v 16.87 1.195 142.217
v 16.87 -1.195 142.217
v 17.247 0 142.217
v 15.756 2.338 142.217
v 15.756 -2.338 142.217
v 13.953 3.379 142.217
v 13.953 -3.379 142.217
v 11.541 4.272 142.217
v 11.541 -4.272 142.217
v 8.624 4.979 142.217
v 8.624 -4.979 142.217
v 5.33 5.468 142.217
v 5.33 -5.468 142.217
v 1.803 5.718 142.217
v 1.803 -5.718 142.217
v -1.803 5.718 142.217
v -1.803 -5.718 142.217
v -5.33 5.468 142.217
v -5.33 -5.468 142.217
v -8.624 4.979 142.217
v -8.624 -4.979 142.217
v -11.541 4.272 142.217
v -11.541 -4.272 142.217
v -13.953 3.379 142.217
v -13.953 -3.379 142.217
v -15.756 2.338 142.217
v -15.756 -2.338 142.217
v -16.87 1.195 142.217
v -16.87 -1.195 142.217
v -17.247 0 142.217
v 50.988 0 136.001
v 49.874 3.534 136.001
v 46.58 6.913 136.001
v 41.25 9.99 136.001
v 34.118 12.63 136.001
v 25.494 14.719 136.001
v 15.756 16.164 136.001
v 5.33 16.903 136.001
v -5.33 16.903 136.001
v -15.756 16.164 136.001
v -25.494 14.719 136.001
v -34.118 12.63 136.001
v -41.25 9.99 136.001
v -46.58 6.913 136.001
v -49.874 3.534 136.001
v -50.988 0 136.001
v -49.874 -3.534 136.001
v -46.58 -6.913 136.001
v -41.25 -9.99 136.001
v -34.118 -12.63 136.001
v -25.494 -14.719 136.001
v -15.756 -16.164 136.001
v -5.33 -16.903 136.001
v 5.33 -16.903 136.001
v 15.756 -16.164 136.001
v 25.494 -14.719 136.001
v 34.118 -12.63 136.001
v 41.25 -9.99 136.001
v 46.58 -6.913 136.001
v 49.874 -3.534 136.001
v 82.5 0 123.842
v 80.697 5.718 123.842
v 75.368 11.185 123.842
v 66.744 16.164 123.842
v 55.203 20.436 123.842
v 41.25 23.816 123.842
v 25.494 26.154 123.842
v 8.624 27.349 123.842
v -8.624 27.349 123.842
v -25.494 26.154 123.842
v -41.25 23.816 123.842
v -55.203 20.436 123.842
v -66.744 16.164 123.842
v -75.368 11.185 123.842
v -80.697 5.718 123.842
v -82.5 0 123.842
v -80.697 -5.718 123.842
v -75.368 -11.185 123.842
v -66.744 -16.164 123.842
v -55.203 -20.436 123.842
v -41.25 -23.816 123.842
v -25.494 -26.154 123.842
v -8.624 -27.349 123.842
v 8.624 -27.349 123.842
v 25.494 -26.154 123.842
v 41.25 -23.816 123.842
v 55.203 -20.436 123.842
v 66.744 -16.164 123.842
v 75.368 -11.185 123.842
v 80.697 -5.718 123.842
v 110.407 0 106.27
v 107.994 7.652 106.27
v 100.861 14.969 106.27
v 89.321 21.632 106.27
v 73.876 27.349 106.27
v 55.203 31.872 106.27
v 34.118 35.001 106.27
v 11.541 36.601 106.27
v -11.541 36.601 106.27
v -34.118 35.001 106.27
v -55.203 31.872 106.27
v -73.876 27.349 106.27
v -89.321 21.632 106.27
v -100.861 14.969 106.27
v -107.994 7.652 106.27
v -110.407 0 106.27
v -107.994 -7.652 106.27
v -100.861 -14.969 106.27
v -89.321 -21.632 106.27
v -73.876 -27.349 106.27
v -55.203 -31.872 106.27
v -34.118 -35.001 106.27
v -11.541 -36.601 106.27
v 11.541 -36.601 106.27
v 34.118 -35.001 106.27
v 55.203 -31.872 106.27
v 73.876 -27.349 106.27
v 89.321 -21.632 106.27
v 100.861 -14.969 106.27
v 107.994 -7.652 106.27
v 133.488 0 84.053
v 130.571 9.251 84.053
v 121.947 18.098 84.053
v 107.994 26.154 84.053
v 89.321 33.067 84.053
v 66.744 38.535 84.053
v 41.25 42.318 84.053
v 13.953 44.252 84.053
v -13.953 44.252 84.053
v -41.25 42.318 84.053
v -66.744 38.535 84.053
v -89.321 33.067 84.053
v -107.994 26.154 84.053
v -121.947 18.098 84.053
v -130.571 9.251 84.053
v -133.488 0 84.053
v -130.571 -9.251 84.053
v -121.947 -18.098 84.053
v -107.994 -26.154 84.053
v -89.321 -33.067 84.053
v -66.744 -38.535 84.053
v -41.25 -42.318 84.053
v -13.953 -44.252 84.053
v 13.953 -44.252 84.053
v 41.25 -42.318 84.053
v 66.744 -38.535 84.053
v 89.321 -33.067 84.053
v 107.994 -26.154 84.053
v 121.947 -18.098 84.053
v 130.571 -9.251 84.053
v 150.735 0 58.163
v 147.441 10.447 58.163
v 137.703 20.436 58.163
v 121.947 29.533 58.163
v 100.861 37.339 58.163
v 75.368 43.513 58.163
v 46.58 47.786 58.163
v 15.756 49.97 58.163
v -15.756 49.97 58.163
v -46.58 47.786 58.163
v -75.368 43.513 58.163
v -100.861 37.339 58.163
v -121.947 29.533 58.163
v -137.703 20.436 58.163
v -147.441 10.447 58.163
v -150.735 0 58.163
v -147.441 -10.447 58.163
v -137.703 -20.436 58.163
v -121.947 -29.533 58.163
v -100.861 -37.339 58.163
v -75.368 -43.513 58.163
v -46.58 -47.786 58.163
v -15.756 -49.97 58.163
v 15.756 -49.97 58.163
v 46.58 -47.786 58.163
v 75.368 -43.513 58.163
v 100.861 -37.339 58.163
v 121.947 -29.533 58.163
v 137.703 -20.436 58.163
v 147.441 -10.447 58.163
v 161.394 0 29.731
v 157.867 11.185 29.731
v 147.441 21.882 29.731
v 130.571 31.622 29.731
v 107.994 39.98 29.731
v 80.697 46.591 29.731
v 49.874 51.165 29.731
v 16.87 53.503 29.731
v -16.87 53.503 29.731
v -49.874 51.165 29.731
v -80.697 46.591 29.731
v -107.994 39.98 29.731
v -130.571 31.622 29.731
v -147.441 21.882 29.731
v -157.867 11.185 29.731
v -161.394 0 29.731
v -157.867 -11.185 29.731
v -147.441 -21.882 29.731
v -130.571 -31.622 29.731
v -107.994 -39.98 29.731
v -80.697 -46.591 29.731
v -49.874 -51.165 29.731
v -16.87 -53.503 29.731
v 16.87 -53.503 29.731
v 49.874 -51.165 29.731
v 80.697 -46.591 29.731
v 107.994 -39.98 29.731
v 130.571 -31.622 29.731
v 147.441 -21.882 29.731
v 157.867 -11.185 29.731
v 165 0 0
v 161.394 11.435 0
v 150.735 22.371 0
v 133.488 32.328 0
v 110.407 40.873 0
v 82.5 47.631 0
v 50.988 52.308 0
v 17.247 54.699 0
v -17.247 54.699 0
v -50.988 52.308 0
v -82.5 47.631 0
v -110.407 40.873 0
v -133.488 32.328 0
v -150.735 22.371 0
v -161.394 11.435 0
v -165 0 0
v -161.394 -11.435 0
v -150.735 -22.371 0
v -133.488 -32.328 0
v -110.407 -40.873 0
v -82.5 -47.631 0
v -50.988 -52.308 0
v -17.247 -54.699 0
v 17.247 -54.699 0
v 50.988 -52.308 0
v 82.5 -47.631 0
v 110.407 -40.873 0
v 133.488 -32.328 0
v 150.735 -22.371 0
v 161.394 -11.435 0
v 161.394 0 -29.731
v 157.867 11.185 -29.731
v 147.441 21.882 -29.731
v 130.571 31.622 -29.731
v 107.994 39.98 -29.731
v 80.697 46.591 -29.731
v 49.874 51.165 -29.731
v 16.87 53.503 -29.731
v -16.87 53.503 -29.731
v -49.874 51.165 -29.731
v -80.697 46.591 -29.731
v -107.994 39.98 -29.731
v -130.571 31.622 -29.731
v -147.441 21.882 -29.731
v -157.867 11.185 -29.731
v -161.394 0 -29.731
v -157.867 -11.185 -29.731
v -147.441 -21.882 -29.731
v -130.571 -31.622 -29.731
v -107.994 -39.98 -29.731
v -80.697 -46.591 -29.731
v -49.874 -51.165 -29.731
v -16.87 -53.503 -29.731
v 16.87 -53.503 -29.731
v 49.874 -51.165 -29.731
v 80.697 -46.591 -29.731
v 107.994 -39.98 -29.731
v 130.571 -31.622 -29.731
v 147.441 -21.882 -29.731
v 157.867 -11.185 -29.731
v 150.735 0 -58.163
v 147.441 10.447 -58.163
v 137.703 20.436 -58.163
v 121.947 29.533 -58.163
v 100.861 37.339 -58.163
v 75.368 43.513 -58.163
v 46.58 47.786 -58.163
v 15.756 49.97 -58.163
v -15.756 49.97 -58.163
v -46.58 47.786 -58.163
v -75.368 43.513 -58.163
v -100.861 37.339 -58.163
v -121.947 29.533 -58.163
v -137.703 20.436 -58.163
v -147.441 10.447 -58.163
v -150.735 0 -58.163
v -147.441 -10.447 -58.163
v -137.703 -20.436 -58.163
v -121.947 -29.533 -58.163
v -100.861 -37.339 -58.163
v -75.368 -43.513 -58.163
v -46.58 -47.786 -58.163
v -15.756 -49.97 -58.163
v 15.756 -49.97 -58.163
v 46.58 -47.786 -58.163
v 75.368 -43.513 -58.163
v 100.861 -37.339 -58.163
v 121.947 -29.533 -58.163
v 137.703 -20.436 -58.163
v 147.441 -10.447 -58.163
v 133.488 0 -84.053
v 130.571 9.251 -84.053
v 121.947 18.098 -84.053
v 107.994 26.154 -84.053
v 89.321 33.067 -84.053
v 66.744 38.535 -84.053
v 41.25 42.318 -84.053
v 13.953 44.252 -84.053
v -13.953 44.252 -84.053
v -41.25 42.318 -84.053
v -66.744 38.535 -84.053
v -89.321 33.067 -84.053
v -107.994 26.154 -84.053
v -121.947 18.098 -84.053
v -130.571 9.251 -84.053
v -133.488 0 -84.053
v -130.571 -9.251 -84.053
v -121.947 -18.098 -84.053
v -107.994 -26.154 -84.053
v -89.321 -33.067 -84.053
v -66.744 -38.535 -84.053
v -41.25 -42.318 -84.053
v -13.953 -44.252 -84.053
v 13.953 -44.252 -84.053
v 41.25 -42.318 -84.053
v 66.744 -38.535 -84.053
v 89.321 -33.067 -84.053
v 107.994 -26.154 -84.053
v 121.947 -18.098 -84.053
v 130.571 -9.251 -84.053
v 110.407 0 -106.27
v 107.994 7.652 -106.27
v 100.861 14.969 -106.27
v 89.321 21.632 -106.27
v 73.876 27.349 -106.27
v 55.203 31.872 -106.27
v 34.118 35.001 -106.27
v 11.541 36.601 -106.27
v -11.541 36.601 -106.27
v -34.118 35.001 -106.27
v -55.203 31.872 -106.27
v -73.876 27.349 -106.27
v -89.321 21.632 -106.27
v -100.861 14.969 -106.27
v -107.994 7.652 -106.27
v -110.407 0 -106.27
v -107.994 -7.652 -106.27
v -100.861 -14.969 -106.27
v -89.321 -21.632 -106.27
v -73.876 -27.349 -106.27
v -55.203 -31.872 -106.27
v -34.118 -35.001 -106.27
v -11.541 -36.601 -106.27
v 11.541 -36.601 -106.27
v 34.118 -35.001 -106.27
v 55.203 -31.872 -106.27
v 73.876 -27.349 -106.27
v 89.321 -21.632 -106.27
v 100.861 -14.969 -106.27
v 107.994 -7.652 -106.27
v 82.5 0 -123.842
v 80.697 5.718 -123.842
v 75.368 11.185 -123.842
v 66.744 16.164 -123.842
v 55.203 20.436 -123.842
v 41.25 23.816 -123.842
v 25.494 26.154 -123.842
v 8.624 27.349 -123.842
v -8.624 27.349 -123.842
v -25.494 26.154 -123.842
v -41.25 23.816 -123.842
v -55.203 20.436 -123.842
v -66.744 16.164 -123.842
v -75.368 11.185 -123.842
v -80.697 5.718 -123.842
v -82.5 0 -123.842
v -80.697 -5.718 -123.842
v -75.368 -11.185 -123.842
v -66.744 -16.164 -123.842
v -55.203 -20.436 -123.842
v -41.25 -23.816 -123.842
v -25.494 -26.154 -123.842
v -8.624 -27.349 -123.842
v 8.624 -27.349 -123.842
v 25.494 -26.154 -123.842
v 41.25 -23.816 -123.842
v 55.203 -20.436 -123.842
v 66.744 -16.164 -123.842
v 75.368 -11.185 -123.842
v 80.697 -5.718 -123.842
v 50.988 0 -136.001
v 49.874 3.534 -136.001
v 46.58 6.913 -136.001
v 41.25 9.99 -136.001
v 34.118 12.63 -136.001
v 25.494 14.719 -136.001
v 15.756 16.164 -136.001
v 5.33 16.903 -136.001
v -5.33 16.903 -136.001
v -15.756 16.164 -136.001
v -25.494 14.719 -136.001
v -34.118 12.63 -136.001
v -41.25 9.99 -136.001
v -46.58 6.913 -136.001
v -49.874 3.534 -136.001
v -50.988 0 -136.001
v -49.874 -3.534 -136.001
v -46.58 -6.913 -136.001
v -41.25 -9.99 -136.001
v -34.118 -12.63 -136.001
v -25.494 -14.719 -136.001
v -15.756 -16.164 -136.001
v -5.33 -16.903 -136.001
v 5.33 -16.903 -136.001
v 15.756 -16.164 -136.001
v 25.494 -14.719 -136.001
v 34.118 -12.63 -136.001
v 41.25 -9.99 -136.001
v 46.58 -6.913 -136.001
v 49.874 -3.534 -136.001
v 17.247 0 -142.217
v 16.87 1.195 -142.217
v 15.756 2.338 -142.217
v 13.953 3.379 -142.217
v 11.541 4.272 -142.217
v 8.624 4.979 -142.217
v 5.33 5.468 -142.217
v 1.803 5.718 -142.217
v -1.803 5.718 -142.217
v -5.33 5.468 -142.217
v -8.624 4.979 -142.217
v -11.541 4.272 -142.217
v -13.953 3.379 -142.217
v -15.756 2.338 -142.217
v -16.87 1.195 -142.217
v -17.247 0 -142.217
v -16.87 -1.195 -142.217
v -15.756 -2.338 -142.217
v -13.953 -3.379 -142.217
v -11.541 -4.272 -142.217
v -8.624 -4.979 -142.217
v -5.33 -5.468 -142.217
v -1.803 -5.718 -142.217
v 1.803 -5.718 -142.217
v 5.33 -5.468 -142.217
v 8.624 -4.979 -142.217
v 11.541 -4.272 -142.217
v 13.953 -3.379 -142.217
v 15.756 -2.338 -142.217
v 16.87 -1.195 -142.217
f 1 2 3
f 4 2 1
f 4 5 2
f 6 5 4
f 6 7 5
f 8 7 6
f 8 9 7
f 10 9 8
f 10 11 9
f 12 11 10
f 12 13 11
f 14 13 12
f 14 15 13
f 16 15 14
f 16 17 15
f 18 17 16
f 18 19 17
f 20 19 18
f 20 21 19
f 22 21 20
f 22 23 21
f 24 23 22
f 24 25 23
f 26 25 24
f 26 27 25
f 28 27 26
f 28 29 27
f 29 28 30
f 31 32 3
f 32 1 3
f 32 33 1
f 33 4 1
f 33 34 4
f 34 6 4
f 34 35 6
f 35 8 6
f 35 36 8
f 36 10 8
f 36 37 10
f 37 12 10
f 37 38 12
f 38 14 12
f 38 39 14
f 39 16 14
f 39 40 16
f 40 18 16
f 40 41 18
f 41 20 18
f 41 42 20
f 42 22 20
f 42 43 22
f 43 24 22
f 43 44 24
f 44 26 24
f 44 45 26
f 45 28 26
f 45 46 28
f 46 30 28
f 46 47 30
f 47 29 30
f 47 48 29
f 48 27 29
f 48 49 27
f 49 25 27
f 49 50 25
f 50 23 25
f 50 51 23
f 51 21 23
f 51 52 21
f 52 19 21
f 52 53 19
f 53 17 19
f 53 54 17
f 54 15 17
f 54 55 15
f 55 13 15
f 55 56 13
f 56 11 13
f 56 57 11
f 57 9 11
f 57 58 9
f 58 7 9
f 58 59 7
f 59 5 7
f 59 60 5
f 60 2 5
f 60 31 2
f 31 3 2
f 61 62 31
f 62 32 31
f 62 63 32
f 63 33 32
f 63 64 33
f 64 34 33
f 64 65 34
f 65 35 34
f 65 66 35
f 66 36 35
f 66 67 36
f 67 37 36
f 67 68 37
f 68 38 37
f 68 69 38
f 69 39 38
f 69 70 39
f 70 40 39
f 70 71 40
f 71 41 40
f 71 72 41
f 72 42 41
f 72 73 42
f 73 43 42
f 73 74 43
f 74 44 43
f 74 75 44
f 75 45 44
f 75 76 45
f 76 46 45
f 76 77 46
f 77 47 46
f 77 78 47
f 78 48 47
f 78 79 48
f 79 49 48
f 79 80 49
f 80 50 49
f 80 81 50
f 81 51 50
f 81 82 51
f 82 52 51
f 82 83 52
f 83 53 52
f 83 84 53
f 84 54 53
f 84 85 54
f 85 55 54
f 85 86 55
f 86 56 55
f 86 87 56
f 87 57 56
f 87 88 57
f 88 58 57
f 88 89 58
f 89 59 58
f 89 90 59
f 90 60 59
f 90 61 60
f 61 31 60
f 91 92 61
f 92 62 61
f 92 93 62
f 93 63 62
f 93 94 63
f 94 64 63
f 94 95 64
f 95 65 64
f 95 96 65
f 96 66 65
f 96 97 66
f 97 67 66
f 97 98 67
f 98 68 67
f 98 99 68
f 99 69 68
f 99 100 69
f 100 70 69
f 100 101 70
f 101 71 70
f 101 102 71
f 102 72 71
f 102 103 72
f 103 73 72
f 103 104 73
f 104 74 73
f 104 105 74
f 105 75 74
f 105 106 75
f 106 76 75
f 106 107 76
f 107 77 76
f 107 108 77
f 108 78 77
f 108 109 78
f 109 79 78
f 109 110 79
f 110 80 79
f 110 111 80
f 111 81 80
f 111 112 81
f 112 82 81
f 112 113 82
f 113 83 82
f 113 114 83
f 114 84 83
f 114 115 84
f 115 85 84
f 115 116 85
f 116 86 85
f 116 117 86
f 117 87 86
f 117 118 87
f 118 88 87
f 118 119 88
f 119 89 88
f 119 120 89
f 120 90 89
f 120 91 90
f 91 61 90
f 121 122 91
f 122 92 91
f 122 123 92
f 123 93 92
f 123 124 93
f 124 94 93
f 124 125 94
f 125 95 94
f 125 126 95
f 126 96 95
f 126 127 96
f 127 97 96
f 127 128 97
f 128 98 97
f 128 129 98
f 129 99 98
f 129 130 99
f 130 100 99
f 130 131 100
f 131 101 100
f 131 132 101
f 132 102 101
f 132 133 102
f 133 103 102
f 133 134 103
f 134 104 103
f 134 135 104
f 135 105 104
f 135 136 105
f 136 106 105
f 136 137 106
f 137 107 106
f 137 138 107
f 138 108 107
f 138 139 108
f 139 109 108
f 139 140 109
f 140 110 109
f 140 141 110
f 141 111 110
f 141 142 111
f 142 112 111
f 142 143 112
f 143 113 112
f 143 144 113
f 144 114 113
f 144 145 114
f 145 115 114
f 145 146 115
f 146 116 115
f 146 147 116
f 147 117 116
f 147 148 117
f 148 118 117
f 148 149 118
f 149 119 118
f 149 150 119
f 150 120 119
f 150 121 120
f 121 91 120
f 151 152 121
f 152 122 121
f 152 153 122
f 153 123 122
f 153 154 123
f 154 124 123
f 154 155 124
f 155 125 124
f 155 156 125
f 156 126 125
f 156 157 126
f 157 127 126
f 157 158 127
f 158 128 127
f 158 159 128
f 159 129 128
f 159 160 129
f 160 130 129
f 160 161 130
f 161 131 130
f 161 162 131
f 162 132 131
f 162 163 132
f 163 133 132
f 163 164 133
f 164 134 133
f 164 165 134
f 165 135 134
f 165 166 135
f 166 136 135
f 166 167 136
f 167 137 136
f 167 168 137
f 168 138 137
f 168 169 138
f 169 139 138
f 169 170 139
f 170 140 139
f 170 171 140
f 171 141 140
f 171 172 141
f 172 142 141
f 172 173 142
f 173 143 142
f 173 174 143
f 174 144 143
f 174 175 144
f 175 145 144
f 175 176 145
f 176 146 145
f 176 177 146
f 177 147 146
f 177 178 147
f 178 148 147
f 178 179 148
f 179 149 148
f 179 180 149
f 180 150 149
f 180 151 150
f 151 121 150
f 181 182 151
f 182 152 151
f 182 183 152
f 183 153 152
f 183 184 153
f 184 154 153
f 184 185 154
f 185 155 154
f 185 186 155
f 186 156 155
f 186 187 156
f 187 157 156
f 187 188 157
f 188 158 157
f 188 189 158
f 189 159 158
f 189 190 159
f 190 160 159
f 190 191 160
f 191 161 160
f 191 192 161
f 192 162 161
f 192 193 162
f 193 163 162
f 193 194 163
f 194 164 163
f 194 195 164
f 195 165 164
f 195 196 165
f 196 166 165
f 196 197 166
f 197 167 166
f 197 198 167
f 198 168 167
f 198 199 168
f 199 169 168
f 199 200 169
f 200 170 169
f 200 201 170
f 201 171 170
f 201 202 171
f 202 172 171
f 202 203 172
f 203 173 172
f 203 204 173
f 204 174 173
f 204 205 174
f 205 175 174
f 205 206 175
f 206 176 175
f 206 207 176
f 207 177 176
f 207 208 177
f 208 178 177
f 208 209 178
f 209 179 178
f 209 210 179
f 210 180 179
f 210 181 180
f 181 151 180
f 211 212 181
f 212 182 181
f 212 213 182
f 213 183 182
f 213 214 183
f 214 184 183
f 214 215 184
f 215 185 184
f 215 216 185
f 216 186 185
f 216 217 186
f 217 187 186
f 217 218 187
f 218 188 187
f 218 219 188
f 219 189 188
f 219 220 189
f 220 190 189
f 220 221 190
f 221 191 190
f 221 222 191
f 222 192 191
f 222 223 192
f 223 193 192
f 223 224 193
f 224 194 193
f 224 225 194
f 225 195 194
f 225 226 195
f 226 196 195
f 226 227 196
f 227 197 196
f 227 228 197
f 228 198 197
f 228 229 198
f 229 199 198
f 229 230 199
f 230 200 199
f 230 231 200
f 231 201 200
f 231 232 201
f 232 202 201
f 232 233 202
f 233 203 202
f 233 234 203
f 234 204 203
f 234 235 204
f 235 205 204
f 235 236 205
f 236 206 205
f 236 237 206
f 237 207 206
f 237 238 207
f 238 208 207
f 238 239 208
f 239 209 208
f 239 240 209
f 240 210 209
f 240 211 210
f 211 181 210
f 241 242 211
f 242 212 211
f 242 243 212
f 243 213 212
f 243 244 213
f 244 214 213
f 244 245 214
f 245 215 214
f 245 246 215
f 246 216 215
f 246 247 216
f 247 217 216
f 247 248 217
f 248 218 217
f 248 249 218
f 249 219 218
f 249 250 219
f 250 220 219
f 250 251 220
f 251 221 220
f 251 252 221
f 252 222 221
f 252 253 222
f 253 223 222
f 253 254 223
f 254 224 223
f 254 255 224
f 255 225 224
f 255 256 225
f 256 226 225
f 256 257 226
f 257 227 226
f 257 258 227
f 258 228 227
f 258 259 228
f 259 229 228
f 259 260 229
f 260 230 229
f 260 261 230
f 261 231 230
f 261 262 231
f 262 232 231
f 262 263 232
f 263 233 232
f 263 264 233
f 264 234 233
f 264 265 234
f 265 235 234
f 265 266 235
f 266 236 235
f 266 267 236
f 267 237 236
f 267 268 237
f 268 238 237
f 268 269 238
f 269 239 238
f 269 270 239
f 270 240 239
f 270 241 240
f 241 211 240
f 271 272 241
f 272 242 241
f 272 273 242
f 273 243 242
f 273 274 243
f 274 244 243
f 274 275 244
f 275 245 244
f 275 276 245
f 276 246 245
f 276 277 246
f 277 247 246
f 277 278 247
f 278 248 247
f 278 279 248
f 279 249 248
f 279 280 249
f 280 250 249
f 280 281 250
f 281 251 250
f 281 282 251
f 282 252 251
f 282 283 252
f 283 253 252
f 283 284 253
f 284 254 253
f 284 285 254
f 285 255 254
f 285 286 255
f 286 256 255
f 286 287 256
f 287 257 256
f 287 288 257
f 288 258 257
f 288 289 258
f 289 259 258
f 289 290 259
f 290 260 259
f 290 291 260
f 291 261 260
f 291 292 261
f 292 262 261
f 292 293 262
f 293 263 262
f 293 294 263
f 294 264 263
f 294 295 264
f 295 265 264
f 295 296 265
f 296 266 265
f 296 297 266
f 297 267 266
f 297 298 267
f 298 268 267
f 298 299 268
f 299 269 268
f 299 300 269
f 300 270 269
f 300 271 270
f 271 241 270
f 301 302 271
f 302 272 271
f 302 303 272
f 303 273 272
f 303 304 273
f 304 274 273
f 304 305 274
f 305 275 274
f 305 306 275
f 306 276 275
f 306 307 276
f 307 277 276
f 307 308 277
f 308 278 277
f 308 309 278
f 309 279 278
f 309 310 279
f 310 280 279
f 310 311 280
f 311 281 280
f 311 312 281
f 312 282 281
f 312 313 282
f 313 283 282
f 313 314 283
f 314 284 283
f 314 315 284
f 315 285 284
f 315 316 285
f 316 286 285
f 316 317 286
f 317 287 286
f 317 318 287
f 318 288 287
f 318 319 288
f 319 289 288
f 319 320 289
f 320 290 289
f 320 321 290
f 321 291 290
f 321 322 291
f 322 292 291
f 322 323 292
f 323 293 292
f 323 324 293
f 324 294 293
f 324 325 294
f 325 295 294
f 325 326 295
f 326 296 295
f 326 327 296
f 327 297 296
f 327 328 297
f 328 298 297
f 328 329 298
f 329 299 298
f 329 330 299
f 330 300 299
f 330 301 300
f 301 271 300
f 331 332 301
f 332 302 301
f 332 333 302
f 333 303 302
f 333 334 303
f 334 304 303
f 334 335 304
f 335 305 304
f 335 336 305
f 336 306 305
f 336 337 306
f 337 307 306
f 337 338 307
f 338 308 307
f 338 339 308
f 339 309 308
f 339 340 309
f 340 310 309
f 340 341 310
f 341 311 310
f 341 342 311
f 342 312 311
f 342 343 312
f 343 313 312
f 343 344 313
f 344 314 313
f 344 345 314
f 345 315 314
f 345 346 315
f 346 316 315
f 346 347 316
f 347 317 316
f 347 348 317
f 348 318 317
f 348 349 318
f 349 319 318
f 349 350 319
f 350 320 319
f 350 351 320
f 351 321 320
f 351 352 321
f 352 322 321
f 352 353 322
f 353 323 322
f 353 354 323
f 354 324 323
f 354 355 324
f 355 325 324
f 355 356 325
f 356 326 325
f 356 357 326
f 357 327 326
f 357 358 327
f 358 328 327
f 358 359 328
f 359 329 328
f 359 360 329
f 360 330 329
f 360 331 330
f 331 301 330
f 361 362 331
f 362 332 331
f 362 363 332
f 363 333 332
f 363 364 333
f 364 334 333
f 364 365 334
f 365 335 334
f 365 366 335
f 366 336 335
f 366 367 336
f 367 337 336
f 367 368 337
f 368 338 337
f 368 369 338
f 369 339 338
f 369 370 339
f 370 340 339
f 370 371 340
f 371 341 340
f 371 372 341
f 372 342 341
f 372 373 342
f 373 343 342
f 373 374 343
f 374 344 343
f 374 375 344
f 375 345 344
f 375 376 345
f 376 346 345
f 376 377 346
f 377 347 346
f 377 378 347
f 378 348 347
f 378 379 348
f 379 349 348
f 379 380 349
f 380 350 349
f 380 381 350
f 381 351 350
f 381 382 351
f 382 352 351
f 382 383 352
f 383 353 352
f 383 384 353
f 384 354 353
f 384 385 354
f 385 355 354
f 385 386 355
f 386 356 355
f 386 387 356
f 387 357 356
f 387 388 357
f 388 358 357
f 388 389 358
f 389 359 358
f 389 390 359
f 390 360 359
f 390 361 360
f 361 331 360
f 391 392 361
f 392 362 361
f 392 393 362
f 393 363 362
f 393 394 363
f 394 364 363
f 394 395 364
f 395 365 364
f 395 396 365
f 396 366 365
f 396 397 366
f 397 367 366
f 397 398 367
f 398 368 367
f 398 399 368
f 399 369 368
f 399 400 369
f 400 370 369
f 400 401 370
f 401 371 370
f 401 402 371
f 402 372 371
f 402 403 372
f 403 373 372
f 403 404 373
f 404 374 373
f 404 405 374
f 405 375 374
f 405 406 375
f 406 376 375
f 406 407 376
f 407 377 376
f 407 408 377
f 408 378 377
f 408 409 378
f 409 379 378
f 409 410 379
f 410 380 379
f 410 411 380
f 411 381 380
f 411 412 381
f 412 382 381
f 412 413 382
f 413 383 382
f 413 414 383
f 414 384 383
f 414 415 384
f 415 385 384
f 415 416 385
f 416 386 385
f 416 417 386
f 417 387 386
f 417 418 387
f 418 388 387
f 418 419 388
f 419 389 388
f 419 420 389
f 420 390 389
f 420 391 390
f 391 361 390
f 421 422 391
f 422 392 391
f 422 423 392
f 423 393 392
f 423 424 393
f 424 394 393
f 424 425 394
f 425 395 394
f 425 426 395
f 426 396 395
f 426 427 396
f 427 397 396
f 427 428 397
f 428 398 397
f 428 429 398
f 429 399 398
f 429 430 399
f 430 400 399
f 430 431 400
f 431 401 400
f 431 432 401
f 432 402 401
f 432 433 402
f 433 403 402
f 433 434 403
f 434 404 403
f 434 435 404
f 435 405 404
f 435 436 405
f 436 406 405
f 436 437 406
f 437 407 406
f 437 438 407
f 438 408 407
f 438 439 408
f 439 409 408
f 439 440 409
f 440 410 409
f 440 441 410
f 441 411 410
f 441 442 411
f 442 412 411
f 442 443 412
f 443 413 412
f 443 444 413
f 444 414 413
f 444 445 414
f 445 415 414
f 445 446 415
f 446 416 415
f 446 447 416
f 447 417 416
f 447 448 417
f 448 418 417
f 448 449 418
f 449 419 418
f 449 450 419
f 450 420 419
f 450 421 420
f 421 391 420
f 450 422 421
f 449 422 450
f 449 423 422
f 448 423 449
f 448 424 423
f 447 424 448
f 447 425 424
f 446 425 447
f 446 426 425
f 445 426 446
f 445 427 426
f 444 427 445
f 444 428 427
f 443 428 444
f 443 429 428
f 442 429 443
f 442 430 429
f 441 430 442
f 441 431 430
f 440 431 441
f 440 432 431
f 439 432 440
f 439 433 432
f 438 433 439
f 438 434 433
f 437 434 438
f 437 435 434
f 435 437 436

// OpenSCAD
// Generated by SolidPython 1.0.1 on 2020-07-29 00:46:51


scale(v = [15, 5, 13]) {
	sphere(r = 11);
}
/***********************************************
*********      SolidPython code:      **********
************************************************
 
# import packages: SolidPython
from solid import *
from solid.utils import *
from itertools import chain, combinations, permutations


class Resize:

    def __init__(self, scad_file):
        self.scad_file = scad_file
        #self.scad_file = import_scad(scad_file)
        # cone/cylinder param:
        self.r1 = 0
        self.r2 = 0
        self.h = 0
        # rectangular prism param:
        self.w = 0
        self.l = 0
        # ellipse param:
        self.r = 0

    # import OpenScad code (file name corresponds to shape)


    # classify shape + parameters
    def assign(self, param1, param2, param3):
        if self.scad_file == 'cone.scad':
            self.r1 = param1
            self.r2 = param2
            self.h = param3
        elif self.scad_file == 'cylinder.scad':
            self.r1 = param1
            self.r2 = param2
            self.h = param3
        elif self.scad_file == 'rectangularPrism.scad':
            self.h = param1
            self.l = param2
            self.w = param3
        else:
            self.r = param1
            self.h = param2

    # resize parameters
    def iterate(self):
        x = range(3, 20, 2)
        i = 1
        if self.scad_file == 'cone.scad':
            tempList = list(permutations(x, 2))
            for temp in tempList:
                param1 = temp[0]
                param2 = temp[1]
                filepath = 'produced_scad_files/' + 'cone' + str(param1) + '_' + str(param2) + '_' + '.scad'
                scad_render_to_file(cylinder(h=param1, r1=param2, r2=0), filepath)

        elif self.scad_file == 'cylinder.scad':
            tempList = list(permutations(x, 3))
            for temp in tempList:
                param1 = temp[0]
                param2 = temp[1]
                filepath = 'produced_scad_files/' + 'cylinder' + str(param1) + '_' + str(param2) + '_' + '.scad'
                scad_render_to_file(cylinder(h=param1, r1=param2, r2=param2), filepath)

        elif self.scad_file == 'rectangularPrism.scad':
            tempList = list(permutations(x, 3))
            for temp in tempList:
                param1 = temp[0]
                param2 = temp[1]
                param3 = temp[2]
                filepath = 'produced_scad_files/' + 'rectangularPrism' + str(param1) + '_' + str(param2) + '_' + str(
                    param3) + '.scad'
                scad_render_to_file(cube(size=(param1, param2, param3)), filepath)

        elif self.scad_file == 'ellipse.scad':
            tempList = list(permutations(x, 4))
            for temp in tempList:
                param1 = temp[0]
                param2 = temp[1]
                param3 = temp[2]
                param4 = temp[3]
                filepath = 'produced_scad_files/' + 'ellipse' + str(param1) + '_' + str(param2) + '_' + str(param3) + '_' + str(param4) + '.scad'
                scad_render_to_file(scale([param1, param2, param3])(sphere(r=param4)), filepath)

    def render_to_scadfile(self):
        scad_render_to_file(scad, 'example.scad') 
 
************************************************/
